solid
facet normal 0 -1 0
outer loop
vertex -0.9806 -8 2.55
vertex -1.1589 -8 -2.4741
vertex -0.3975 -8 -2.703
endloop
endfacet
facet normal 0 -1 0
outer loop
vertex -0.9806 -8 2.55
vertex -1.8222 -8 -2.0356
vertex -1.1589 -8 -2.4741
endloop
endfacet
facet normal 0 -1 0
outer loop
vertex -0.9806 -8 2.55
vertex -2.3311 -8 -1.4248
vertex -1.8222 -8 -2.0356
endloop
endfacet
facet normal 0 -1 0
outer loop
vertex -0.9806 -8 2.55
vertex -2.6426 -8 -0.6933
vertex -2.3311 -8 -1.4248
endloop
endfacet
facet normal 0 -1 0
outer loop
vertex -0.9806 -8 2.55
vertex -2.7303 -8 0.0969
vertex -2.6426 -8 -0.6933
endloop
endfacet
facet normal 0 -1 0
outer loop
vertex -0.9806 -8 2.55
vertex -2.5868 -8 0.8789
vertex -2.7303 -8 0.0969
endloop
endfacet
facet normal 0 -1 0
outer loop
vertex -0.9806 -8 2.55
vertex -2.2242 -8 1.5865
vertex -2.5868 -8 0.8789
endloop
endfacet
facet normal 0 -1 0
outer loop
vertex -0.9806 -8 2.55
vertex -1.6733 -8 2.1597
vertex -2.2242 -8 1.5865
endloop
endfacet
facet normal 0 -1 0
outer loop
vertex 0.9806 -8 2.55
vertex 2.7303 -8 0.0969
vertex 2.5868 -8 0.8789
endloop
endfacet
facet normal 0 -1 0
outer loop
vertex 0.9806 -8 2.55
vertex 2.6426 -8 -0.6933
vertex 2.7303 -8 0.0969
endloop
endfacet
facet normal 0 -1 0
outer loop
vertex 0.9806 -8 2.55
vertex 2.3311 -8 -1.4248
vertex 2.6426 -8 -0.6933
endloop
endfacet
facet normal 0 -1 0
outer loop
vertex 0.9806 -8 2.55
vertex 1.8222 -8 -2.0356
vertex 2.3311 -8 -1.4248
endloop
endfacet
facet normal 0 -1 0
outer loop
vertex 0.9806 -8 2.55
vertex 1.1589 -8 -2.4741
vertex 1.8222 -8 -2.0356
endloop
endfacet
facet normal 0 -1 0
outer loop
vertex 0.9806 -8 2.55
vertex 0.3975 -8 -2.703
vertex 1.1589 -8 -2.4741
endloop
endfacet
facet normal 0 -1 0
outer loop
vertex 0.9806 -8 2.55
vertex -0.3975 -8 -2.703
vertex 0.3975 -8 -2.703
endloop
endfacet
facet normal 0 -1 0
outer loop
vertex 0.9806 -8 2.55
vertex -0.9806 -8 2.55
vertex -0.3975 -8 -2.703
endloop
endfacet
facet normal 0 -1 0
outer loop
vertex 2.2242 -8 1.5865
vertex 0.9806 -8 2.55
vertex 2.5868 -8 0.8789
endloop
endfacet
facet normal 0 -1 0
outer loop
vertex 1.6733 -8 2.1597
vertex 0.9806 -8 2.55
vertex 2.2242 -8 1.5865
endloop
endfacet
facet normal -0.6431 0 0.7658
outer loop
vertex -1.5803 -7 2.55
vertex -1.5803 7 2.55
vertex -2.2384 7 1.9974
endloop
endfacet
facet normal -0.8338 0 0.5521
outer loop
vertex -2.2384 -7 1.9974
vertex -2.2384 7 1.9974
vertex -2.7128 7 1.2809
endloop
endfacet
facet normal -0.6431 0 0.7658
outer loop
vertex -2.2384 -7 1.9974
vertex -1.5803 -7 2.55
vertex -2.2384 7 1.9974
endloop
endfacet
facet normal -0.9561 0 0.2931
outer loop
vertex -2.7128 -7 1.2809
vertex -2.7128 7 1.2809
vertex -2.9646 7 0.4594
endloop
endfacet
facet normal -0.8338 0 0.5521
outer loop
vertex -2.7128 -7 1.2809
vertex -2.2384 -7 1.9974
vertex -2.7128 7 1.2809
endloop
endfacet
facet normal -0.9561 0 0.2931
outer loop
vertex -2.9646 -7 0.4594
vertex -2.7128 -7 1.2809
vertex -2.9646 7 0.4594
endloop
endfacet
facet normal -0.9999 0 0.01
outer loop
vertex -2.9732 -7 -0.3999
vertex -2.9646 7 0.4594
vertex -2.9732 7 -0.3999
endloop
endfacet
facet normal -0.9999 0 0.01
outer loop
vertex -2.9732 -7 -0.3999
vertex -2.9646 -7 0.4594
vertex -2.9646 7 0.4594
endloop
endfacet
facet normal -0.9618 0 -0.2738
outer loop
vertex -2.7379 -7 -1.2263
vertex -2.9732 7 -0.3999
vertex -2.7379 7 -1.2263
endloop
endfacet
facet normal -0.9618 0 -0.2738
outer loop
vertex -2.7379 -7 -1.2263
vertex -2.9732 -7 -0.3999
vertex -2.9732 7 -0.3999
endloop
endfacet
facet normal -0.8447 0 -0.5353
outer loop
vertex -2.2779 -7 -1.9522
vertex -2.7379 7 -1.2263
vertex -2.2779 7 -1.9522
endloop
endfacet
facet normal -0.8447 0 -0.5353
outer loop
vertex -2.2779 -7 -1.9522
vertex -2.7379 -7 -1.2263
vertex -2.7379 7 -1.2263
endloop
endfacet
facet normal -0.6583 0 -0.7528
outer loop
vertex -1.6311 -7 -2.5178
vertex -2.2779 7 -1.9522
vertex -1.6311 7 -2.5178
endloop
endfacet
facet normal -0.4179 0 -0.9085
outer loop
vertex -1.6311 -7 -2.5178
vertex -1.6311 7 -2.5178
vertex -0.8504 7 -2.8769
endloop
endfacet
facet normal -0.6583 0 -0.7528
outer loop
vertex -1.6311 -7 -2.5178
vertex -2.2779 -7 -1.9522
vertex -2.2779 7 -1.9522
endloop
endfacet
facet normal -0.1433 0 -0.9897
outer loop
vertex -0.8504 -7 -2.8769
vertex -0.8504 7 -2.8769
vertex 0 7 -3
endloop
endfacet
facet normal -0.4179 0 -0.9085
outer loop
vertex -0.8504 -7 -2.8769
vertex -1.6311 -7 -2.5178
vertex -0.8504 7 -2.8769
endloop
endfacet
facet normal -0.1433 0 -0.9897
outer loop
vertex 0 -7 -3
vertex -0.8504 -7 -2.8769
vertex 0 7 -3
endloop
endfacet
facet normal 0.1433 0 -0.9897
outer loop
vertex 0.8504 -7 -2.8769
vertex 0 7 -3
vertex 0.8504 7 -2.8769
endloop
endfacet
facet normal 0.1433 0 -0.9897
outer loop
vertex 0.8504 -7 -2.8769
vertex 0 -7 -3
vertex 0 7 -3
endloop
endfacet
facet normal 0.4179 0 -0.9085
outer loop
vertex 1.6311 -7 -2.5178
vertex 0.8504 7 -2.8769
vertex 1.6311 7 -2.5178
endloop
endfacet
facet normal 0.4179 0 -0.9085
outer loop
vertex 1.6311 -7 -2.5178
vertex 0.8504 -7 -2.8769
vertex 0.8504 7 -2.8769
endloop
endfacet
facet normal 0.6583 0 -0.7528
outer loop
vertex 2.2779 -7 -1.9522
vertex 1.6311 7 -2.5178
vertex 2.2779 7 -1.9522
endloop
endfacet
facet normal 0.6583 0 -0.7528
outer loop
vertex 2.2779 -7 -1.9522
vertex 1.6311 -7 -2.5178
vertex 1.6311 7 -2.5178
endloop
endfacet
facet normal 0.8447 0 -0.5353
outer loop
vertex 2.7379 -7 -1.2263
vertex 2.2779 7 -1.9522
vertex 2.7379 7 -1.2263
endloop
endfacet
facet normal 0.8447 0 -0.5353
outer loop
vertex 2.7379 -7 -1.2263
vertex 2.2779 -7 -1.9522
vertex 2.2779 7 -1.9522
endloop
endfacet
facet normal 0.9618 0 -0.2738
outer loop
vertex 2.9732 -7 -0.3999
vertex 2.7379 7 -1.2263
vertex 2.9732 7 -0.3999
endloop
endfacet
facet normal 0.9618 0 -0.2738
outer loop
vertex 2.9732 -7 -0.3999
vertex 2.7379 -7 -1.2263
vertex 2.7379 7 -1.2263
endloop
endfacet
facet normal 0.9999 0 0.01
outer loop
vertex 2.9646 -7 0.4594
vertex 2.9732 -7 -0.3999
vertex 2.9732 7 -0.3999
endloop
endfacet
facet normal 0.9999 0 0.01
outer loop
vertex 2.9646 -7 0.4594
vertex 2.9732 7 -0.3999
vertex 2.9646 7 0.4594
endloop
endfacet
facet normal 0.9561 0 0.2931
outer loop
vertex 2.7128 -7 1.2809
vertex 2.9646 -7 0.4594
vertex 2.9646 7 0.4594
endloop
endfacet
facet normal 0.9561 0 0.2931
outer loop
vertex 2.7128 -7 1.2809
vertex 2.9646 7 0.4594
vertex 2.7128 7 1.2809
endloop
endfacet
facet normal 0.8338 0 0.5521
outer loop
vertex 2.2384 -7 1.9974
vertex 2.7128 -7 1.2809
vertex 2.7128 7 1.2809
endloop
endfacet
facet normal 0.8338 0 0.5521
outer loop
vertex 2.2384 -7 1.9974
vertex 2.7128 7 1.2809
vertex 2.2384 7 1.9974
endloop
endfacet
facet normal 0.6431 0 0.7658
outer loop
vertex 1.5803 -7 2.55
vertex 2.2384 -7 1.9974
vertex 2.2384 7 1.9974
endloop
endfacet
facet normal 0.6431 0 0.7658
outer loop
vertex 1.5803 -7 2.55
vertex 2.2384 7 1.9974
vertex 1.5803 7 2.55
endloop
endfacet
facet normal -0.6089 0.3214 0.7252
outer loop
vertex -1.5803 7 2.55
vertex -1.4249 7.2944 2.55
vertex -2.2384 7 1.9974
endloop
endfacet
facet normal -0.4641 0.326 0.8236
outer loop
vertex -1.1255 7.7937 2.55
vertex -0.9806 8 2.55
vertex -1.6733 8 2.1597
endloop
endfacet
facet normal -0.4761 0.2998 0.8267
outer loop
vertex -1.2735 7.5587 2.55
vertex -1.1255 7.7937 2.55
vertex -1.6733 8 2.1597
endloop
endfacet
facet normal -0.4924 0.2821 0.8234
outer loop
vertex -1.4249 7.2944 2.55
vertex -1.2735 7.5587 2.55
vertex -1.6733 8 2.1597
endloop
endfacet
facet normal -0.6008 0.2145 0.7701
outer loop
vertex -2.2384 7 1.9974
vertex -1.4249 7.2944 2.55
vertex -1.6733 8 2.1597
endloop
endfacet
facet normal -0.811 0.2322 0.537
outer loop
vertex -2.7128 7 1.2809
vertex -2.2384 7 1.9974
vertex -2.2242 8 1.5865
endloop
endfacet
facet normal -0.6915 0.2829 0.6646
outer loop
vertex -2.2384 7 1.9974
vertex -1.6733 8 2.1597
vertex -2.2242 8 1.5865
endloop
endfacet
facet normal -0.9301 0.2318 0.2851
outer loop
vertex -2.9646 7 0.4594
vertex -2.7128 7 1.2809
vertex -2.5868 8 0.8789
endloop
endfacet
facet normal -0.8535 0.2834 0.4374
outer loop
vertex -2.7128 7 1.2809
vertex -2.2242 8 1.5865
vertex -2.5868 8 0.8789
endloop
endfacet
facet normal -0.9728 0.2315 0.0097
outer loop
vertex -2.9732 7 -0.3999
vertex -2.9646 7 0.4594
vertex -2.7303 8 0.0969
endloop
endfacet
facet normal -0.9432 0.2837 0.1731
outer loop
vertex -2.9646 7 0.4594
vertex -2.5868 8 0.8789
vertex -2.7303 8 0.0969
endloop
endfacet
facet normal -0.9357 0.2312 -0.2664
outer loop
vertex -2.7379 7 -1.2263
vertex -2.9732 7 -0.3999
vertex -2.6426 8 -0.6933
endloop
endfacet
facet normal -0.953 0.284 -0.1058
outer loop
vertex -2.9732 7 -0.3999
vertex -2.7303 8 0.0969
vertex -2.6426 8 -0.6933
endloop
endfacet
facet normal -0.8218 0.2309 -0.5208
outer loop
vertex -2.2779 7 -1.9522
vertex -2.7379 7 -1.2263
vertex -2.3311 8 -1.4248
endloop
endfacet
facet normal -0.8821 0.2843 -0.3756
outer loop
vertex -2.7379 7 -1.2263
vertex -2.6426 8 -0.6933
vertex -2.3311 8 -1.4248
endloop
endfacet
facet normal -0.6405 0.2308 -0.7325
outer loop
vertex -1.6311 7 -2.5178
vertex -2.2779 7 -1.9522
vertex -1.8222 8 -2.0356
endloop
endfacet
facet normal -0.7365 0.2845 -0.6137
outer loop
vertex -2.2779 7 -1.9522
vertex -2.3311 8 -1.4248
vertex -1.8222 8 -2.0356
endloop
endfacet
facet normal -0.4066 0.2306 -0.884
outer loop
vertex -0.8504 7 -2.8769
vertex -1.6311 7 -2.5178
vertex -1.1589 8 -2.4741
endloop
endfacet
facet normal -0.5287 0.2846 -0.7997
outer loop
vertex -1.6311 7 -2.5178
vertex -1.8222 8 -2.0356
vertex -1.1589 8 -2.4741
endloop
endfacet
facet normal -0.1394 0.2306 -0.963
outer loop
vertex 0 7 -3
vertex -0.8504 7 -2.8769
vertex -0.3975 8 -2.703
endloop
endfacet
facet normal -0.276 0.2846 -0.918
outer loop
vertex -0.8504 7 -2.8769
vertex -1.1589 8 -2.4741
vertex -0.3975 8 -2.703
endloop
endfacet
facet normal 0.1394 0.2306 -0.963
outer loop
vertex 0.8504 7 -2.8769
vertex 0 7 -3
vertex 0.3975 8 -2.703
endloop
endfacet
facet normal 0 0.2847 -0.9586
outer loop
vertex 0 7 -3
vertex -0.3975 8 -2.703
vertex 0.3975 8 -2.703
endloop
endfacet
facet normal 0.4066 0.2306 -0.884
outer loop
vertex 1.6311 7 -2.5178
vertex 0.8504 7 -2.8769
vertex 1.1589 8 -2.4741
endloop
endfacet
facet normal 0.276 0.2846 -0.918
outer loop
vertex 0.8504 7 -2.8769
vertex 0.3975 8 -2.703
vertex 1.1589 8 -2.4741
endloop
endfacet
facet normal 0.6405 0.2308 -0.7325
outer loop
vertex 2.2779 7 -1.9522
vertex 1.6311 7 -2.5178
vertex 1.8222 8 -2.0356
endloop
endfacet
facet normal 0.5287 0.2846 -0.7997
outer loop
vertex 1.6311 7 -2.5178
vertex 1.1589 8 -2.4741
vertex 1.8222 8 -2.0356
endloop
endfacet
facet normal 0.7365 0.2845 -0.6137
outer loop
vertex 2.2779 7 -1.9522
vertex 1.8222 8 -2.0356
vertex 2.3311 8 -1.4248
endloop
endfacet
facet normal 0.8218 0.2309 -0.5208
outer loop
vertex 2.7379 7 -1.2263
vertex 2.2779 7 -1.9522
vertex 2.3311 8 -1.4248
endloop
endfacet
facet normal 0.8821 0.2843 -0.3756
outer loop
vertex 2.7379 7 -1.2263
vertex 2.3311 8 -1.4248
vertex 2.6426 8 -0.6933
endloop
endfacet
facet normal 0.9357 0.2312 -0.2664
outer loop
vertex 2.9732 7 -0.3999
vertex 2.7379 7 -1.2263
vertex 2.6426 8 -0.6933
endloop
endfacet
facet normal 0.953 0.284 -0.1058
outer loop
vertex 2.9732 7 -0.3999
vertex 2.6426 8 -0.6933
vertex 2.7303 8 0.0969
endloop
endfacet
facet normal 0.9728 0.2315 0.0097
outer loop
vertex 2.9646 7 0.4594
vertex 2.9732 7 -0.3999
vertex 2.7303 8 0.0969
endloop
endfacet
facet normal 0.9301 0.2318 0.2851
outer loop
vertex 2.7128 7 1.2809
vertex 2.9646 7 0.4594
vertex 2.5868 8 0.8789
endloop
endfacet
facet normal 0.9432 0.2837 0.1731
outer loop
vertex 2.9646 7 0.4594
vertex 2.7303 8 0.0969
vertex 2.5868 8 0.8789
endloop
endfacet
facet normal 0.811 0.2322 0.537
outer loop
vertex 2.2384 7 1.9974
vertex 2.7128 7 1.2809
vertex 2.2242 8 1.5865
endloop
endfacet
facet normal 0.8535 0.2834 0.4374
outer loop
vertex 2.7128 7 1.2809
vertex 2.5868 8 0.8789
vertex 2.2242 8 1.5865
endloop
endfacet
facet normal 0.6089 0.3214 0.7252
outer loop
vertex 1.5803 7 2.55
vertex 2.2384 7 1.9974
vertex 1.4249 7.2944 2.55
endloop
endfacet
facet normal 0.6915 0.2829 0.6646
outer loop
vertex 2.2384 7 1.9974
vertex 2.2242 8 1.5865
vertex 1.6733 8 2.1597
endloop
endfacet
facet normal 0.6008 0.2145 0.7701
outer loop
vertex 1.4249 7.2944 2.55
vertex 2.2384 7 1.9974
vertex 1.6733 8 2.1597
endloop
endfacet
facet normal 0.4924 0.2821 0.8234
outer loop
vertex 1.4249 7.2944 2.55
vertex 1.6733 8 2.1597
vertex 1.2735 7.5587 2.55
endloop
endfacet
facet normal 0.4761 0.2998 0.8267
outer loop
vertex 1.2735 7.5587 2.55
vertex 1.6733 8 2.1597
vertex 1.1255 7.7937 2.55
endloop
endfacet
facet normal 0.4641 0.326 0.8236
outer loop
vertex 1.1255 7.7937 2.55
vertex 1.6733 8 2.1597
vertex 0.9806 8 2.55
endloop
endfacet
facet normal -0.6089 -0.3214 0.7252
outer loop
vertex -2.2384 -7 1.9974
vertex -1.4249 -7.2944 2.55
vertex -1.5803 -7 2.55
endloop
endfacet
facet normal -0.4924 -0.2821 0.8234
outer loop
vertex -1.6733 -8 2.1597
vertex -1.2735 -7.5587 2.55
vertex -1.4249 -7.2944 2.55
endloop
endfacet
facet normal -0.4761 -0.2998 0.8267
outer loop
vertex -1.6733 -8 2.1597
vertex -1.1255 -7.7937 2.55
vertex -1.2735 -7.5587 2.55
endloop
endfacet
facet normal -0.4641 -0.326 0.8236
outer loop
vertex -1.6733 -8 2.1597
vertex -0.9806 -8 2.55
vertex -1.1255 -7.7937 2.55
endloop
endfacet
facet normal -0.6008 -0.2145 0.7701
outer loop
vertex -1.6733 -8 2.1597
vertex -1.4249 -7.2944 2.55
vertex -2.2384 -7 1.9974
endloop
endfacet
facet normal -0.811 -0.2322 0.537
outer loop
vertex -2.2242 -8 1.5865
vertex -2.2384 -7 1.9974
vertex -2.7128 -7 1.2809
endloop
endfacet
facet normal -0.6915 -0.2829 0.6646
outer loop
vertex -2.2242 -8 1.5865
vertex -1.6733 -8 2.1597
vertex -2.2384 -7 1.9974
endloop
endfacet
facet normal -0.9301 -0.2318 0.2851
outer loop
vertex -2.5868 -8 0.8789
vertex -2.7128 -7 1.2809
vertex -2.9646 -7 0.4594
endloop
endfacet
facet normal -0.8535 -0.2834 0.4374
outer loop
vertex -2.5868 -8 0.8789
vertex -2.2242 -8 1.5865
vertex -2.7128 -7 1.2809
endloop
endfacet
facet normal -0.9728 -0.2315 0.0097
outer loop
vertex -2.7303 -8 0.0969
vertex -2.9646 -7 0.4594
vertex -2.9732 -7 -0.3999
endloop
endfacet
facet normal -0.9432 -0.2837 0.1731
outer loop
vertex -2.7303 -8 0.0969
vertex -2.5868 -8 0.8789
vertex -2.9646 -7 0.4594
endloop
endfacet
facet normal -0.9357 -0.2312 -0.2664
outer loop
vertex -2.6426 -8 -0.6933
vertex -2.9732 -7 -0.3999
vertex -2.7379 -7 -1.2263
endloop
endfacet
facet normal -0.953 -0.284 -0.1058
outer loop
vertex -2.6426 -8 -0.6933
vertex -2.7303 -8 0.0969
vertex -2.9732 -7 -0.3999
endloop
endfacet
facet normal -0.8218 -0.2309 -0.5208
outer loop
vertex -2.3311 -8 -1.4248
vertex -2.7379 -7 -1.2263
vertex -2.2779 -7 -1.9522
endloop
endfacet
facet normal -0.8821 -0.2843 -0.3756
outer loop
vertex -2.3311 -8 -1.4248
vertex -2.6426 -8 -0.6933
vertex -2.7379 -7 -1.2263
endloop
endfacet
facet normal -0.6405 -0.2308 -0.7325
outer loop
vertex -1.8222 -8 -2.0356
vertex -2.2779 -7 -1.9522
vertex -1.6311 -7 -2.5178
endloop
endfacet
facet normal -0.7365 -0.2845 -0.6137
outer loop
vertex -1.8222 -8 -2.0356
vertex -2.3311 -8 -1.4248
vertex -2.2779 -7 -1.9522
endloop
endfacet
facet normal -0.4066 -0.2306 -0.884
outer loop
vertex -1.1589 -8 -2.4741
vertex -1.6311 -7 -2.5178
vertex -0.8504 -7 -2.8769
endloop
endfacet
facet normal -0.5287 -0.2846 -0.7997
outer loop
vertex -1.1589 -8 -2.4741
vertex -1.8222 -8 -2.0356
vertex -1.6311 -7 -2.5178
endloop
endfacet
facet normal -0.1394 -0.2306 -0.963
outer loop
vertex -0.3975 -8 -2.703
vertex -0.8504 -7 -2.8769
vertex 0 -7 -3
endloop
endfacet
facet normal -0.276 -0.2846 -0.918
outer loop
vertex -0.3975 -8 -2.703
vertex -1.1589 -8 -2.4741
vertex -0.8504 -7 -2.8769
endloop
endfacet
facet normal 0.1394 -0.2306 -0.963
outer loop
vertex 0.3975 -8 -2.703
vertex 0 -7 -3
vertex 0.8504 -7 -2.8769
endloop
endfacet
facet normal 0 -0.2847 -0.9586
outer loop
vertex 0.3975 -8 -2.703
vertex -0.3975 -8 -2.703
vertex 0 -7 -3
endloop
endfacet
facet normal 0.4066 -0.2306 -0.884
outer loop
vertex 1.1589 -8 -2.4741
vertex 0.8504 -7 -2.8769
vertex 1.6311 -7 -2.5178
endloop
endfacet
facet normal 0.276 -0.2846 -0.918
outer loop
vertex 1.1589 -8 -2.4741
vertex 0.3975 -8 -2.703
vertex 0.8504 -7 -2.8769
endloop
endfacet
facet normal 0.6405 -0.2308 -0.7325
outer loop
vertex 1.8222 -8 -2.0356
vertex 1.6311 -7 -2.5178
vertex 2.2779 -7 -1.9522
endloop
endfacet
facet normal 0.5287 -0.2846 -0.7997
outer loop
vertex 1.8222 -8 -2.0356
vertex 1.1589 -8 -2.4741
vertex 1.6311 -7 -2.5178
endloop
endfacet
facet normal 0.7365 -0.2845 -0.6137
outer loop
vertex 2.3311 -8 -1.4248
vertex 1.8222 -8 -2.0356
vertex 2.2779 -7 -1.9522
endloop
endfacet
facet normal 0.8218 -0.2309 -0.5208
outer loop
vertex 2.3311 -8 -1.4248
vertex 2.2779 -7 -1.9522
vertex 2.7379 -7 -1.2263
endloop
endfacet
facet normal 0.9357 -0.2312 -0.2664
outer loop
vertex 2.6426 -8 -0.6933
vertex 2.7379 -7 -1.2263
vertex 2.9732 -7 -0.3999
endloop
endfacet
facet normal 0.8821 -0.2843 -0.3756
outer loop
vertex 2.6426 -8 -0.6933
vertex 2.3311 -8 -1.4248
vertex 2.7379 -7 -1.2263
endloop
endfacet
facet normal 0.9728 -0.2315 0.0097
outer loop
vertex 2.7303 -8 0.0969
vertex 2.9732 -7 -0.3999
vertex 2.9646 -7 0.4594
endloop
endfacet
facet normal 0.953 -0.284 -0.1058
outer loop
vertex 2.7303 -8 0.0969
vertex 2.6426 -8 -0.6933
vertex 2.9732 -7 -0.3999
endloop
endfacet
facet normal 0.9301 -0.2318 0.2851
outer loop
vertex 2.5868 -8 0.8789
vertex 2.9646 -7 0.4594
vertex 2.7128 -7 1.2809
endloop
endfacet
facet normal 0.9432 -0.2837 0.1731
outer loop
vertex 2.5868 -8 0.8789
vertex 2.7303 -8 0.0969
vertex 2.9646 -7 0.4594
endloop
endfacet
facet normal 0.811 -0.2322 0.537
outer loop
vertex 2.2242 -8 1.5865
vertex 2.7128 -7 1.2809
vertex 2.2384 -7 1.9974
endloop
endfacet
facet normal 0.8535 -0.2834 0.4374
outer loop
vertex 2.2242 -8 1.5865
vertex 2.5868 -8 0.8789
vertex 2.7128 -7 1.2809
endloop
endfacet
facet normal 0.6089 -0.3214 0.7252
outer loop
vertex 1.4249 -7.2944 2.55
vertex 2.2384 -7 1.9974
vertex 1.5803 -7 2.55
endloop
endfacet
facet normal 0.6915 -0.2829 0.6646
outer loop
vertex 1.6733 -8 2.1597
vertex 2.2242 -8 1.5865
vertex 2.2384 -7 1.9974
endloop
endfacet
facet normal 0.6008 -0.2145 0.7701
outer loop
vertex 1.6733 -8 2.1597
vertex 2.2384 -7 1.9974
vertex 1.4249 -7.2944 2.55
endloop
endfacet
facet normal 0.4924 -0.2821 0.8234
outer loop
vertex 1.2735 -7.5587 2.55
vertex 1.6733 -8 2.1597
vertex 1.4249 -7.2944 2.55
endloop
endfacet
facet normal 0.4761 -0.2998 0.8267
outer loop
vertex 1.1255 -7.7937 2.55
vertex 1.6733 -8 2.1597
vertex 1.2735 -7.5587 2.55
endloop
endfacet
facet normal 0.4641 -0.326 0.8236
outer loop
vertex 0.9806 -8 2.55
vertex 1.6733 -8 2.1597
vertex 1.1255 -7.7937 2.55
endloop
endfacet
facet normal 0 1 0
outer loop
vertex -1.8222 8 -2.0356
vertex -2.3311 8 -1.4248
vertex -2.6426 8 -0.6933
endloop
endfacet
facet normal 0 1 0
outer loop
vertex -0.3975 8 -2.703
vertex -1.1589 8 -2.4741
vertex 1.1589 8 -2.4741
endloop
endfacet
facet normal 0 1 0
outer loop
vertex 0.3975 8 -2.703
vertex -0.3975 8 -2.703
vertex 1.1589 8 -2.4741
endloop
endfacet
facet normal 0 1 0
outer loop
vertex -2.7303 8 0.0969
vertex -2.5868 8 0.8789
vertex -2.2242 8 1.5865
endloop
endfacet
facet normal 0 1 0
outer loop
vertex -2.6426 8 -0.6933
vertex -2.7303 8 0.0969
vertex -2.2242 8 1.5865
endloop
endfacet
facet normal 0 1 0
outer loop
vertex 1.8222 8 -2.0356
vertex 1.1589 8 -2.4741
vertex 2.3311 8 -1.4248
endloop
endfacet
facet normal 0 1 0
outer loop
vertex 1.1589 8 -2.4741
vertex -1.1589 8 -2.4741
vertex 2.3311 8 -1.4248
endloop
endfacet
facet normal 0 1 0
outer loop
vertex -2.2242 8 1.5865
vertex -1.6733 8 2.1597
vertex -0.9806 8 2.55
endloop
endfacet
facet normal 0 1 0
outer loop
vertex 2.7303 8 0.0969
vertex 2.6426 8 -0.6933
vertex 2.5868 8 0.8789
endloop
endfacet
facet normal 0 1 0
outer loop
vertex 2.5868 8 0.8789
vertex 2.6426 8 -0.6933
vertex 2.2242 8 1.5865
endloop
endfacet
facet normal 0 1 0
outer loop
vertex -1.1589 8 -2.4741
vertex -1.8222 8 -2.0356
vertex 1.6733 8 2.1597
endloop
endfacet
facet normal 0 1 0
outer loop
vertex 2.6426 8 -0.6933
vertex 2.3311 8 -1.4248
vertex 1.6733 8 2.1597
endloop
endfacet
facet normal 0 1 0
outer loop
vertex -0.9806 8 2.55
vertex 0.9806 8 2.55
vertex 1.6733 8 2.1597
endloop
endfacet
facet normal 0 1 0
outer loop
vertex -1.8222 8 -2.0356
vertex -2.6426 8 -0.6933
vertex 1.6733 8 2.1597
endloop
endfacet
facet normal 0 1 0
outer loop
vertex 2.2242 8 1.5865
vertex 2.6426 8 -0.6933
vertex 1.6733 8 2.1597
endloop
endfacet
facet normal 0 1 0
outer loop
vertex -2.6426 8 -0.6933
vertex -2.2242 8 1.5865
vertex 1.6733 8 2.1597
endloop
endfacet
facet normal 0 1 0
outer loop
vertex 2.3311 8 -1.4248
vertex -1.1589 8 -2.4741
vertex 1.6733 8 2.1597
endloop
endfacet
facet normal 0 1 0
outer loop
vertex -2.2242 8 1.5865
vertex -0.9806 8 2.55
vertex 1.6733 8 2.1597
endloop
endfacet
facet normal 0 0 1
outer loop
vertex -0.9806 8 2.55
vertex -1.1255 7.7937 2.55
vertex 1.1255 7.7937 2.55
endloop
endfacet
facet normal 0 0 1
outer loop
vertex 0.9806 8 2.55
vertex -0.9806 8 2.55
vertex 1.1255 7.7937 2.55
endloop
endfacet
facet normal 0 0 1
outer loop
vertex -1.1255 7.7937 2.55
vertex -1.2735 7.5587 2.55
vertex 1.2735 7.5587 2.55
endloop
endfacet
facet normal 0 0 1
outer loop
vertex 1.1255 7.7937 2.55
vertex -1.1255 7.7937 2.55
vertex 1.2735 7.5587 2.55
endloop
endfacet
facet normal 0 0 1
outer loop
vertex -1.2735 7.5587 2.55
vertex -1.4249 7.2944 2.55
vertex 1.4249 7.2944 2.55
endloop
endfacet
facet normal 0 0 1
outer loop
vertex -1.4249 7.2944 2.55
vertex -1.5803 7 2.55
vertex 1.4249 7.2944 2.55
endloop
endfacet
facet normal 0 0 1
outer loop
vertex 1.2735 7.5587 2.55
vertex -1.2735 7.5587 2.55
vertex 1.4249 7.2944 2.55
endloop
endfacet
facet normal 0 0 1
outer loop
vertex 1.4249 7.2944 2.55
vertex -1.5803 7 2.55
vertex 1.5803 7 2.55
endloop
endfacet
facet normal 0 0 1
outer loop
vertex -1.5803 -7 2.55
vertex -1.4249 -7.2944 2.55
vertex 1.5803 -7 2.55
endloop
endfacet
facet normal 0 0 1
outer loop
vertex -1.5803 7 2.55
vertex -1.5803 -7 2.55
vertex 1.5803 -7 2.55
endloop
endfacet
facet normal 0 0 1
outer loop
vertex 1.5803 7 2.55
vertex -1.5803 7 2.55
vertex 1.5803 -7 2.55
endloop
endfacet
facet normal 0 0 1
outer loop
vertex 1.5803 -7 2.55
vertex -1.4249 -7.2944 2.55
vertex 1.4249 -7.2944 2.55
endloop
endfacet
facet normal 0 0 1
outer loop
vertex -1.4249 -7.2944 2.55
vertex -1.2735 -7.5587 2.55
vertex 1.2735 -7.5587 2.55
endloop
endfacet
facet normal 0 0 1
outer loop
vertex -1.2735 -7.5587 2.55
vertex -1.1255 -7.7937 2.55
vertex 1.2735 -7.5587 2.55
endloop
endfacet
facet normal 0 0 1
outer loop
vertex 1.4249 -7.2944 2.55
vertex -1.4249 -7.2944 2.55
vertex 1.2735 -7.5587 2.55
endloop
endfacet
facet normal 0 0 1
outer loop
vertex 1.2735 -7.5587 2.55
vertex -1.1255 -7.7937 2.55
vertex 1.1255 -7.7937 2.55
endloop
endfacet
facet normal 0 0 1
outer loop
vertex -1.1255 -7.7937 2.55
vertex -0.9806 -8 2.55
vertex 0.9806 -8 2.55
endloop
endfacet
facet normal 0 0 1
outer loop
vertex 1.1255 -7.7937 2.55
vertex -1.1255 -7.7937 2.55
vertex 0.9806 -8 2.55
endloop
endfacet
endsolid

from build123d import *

# Parameters (mm, degrees)
F1_R     = 3
F2_DEPTH = 8
F3_SIZE2 = 0.2679491924
F3_SIZE  = 1
F4_W     = 6
F4_H     = 6
F5_DEPTH = 8


with BuildPart() as f2:
    # F1 (on Front) → F2 (new body, symmetric)
    with BuildSketch(Plane.XZ):
        Circle(F1_R)
    extrude(amount=F2_DEPTH, both=True)

    # F3
    f3_edges = [f2.edges().sort_by_distance(p)[0] for p in [
        (-3, -8, 0),
        (-3, 8, 0),
    ]]
    f3_side = f2.faces().sort_by_distance((-3, 0, 0))[0]
    chamfer(f3_edges, length=F3_SIZE, length2=F3_SIZE2, reference=f3_side)

    # F4 (on Front) → F5 (cut, symmetric)
    with BuildSketch(Plane.XZ):
        with Locations((0, 5.55)):
            Rectangle(F4_W, F4_H)
    extrude(amount=F5_DEPTH, both=True, mode=Mode.SUBTRACT)


solid = f2.part
